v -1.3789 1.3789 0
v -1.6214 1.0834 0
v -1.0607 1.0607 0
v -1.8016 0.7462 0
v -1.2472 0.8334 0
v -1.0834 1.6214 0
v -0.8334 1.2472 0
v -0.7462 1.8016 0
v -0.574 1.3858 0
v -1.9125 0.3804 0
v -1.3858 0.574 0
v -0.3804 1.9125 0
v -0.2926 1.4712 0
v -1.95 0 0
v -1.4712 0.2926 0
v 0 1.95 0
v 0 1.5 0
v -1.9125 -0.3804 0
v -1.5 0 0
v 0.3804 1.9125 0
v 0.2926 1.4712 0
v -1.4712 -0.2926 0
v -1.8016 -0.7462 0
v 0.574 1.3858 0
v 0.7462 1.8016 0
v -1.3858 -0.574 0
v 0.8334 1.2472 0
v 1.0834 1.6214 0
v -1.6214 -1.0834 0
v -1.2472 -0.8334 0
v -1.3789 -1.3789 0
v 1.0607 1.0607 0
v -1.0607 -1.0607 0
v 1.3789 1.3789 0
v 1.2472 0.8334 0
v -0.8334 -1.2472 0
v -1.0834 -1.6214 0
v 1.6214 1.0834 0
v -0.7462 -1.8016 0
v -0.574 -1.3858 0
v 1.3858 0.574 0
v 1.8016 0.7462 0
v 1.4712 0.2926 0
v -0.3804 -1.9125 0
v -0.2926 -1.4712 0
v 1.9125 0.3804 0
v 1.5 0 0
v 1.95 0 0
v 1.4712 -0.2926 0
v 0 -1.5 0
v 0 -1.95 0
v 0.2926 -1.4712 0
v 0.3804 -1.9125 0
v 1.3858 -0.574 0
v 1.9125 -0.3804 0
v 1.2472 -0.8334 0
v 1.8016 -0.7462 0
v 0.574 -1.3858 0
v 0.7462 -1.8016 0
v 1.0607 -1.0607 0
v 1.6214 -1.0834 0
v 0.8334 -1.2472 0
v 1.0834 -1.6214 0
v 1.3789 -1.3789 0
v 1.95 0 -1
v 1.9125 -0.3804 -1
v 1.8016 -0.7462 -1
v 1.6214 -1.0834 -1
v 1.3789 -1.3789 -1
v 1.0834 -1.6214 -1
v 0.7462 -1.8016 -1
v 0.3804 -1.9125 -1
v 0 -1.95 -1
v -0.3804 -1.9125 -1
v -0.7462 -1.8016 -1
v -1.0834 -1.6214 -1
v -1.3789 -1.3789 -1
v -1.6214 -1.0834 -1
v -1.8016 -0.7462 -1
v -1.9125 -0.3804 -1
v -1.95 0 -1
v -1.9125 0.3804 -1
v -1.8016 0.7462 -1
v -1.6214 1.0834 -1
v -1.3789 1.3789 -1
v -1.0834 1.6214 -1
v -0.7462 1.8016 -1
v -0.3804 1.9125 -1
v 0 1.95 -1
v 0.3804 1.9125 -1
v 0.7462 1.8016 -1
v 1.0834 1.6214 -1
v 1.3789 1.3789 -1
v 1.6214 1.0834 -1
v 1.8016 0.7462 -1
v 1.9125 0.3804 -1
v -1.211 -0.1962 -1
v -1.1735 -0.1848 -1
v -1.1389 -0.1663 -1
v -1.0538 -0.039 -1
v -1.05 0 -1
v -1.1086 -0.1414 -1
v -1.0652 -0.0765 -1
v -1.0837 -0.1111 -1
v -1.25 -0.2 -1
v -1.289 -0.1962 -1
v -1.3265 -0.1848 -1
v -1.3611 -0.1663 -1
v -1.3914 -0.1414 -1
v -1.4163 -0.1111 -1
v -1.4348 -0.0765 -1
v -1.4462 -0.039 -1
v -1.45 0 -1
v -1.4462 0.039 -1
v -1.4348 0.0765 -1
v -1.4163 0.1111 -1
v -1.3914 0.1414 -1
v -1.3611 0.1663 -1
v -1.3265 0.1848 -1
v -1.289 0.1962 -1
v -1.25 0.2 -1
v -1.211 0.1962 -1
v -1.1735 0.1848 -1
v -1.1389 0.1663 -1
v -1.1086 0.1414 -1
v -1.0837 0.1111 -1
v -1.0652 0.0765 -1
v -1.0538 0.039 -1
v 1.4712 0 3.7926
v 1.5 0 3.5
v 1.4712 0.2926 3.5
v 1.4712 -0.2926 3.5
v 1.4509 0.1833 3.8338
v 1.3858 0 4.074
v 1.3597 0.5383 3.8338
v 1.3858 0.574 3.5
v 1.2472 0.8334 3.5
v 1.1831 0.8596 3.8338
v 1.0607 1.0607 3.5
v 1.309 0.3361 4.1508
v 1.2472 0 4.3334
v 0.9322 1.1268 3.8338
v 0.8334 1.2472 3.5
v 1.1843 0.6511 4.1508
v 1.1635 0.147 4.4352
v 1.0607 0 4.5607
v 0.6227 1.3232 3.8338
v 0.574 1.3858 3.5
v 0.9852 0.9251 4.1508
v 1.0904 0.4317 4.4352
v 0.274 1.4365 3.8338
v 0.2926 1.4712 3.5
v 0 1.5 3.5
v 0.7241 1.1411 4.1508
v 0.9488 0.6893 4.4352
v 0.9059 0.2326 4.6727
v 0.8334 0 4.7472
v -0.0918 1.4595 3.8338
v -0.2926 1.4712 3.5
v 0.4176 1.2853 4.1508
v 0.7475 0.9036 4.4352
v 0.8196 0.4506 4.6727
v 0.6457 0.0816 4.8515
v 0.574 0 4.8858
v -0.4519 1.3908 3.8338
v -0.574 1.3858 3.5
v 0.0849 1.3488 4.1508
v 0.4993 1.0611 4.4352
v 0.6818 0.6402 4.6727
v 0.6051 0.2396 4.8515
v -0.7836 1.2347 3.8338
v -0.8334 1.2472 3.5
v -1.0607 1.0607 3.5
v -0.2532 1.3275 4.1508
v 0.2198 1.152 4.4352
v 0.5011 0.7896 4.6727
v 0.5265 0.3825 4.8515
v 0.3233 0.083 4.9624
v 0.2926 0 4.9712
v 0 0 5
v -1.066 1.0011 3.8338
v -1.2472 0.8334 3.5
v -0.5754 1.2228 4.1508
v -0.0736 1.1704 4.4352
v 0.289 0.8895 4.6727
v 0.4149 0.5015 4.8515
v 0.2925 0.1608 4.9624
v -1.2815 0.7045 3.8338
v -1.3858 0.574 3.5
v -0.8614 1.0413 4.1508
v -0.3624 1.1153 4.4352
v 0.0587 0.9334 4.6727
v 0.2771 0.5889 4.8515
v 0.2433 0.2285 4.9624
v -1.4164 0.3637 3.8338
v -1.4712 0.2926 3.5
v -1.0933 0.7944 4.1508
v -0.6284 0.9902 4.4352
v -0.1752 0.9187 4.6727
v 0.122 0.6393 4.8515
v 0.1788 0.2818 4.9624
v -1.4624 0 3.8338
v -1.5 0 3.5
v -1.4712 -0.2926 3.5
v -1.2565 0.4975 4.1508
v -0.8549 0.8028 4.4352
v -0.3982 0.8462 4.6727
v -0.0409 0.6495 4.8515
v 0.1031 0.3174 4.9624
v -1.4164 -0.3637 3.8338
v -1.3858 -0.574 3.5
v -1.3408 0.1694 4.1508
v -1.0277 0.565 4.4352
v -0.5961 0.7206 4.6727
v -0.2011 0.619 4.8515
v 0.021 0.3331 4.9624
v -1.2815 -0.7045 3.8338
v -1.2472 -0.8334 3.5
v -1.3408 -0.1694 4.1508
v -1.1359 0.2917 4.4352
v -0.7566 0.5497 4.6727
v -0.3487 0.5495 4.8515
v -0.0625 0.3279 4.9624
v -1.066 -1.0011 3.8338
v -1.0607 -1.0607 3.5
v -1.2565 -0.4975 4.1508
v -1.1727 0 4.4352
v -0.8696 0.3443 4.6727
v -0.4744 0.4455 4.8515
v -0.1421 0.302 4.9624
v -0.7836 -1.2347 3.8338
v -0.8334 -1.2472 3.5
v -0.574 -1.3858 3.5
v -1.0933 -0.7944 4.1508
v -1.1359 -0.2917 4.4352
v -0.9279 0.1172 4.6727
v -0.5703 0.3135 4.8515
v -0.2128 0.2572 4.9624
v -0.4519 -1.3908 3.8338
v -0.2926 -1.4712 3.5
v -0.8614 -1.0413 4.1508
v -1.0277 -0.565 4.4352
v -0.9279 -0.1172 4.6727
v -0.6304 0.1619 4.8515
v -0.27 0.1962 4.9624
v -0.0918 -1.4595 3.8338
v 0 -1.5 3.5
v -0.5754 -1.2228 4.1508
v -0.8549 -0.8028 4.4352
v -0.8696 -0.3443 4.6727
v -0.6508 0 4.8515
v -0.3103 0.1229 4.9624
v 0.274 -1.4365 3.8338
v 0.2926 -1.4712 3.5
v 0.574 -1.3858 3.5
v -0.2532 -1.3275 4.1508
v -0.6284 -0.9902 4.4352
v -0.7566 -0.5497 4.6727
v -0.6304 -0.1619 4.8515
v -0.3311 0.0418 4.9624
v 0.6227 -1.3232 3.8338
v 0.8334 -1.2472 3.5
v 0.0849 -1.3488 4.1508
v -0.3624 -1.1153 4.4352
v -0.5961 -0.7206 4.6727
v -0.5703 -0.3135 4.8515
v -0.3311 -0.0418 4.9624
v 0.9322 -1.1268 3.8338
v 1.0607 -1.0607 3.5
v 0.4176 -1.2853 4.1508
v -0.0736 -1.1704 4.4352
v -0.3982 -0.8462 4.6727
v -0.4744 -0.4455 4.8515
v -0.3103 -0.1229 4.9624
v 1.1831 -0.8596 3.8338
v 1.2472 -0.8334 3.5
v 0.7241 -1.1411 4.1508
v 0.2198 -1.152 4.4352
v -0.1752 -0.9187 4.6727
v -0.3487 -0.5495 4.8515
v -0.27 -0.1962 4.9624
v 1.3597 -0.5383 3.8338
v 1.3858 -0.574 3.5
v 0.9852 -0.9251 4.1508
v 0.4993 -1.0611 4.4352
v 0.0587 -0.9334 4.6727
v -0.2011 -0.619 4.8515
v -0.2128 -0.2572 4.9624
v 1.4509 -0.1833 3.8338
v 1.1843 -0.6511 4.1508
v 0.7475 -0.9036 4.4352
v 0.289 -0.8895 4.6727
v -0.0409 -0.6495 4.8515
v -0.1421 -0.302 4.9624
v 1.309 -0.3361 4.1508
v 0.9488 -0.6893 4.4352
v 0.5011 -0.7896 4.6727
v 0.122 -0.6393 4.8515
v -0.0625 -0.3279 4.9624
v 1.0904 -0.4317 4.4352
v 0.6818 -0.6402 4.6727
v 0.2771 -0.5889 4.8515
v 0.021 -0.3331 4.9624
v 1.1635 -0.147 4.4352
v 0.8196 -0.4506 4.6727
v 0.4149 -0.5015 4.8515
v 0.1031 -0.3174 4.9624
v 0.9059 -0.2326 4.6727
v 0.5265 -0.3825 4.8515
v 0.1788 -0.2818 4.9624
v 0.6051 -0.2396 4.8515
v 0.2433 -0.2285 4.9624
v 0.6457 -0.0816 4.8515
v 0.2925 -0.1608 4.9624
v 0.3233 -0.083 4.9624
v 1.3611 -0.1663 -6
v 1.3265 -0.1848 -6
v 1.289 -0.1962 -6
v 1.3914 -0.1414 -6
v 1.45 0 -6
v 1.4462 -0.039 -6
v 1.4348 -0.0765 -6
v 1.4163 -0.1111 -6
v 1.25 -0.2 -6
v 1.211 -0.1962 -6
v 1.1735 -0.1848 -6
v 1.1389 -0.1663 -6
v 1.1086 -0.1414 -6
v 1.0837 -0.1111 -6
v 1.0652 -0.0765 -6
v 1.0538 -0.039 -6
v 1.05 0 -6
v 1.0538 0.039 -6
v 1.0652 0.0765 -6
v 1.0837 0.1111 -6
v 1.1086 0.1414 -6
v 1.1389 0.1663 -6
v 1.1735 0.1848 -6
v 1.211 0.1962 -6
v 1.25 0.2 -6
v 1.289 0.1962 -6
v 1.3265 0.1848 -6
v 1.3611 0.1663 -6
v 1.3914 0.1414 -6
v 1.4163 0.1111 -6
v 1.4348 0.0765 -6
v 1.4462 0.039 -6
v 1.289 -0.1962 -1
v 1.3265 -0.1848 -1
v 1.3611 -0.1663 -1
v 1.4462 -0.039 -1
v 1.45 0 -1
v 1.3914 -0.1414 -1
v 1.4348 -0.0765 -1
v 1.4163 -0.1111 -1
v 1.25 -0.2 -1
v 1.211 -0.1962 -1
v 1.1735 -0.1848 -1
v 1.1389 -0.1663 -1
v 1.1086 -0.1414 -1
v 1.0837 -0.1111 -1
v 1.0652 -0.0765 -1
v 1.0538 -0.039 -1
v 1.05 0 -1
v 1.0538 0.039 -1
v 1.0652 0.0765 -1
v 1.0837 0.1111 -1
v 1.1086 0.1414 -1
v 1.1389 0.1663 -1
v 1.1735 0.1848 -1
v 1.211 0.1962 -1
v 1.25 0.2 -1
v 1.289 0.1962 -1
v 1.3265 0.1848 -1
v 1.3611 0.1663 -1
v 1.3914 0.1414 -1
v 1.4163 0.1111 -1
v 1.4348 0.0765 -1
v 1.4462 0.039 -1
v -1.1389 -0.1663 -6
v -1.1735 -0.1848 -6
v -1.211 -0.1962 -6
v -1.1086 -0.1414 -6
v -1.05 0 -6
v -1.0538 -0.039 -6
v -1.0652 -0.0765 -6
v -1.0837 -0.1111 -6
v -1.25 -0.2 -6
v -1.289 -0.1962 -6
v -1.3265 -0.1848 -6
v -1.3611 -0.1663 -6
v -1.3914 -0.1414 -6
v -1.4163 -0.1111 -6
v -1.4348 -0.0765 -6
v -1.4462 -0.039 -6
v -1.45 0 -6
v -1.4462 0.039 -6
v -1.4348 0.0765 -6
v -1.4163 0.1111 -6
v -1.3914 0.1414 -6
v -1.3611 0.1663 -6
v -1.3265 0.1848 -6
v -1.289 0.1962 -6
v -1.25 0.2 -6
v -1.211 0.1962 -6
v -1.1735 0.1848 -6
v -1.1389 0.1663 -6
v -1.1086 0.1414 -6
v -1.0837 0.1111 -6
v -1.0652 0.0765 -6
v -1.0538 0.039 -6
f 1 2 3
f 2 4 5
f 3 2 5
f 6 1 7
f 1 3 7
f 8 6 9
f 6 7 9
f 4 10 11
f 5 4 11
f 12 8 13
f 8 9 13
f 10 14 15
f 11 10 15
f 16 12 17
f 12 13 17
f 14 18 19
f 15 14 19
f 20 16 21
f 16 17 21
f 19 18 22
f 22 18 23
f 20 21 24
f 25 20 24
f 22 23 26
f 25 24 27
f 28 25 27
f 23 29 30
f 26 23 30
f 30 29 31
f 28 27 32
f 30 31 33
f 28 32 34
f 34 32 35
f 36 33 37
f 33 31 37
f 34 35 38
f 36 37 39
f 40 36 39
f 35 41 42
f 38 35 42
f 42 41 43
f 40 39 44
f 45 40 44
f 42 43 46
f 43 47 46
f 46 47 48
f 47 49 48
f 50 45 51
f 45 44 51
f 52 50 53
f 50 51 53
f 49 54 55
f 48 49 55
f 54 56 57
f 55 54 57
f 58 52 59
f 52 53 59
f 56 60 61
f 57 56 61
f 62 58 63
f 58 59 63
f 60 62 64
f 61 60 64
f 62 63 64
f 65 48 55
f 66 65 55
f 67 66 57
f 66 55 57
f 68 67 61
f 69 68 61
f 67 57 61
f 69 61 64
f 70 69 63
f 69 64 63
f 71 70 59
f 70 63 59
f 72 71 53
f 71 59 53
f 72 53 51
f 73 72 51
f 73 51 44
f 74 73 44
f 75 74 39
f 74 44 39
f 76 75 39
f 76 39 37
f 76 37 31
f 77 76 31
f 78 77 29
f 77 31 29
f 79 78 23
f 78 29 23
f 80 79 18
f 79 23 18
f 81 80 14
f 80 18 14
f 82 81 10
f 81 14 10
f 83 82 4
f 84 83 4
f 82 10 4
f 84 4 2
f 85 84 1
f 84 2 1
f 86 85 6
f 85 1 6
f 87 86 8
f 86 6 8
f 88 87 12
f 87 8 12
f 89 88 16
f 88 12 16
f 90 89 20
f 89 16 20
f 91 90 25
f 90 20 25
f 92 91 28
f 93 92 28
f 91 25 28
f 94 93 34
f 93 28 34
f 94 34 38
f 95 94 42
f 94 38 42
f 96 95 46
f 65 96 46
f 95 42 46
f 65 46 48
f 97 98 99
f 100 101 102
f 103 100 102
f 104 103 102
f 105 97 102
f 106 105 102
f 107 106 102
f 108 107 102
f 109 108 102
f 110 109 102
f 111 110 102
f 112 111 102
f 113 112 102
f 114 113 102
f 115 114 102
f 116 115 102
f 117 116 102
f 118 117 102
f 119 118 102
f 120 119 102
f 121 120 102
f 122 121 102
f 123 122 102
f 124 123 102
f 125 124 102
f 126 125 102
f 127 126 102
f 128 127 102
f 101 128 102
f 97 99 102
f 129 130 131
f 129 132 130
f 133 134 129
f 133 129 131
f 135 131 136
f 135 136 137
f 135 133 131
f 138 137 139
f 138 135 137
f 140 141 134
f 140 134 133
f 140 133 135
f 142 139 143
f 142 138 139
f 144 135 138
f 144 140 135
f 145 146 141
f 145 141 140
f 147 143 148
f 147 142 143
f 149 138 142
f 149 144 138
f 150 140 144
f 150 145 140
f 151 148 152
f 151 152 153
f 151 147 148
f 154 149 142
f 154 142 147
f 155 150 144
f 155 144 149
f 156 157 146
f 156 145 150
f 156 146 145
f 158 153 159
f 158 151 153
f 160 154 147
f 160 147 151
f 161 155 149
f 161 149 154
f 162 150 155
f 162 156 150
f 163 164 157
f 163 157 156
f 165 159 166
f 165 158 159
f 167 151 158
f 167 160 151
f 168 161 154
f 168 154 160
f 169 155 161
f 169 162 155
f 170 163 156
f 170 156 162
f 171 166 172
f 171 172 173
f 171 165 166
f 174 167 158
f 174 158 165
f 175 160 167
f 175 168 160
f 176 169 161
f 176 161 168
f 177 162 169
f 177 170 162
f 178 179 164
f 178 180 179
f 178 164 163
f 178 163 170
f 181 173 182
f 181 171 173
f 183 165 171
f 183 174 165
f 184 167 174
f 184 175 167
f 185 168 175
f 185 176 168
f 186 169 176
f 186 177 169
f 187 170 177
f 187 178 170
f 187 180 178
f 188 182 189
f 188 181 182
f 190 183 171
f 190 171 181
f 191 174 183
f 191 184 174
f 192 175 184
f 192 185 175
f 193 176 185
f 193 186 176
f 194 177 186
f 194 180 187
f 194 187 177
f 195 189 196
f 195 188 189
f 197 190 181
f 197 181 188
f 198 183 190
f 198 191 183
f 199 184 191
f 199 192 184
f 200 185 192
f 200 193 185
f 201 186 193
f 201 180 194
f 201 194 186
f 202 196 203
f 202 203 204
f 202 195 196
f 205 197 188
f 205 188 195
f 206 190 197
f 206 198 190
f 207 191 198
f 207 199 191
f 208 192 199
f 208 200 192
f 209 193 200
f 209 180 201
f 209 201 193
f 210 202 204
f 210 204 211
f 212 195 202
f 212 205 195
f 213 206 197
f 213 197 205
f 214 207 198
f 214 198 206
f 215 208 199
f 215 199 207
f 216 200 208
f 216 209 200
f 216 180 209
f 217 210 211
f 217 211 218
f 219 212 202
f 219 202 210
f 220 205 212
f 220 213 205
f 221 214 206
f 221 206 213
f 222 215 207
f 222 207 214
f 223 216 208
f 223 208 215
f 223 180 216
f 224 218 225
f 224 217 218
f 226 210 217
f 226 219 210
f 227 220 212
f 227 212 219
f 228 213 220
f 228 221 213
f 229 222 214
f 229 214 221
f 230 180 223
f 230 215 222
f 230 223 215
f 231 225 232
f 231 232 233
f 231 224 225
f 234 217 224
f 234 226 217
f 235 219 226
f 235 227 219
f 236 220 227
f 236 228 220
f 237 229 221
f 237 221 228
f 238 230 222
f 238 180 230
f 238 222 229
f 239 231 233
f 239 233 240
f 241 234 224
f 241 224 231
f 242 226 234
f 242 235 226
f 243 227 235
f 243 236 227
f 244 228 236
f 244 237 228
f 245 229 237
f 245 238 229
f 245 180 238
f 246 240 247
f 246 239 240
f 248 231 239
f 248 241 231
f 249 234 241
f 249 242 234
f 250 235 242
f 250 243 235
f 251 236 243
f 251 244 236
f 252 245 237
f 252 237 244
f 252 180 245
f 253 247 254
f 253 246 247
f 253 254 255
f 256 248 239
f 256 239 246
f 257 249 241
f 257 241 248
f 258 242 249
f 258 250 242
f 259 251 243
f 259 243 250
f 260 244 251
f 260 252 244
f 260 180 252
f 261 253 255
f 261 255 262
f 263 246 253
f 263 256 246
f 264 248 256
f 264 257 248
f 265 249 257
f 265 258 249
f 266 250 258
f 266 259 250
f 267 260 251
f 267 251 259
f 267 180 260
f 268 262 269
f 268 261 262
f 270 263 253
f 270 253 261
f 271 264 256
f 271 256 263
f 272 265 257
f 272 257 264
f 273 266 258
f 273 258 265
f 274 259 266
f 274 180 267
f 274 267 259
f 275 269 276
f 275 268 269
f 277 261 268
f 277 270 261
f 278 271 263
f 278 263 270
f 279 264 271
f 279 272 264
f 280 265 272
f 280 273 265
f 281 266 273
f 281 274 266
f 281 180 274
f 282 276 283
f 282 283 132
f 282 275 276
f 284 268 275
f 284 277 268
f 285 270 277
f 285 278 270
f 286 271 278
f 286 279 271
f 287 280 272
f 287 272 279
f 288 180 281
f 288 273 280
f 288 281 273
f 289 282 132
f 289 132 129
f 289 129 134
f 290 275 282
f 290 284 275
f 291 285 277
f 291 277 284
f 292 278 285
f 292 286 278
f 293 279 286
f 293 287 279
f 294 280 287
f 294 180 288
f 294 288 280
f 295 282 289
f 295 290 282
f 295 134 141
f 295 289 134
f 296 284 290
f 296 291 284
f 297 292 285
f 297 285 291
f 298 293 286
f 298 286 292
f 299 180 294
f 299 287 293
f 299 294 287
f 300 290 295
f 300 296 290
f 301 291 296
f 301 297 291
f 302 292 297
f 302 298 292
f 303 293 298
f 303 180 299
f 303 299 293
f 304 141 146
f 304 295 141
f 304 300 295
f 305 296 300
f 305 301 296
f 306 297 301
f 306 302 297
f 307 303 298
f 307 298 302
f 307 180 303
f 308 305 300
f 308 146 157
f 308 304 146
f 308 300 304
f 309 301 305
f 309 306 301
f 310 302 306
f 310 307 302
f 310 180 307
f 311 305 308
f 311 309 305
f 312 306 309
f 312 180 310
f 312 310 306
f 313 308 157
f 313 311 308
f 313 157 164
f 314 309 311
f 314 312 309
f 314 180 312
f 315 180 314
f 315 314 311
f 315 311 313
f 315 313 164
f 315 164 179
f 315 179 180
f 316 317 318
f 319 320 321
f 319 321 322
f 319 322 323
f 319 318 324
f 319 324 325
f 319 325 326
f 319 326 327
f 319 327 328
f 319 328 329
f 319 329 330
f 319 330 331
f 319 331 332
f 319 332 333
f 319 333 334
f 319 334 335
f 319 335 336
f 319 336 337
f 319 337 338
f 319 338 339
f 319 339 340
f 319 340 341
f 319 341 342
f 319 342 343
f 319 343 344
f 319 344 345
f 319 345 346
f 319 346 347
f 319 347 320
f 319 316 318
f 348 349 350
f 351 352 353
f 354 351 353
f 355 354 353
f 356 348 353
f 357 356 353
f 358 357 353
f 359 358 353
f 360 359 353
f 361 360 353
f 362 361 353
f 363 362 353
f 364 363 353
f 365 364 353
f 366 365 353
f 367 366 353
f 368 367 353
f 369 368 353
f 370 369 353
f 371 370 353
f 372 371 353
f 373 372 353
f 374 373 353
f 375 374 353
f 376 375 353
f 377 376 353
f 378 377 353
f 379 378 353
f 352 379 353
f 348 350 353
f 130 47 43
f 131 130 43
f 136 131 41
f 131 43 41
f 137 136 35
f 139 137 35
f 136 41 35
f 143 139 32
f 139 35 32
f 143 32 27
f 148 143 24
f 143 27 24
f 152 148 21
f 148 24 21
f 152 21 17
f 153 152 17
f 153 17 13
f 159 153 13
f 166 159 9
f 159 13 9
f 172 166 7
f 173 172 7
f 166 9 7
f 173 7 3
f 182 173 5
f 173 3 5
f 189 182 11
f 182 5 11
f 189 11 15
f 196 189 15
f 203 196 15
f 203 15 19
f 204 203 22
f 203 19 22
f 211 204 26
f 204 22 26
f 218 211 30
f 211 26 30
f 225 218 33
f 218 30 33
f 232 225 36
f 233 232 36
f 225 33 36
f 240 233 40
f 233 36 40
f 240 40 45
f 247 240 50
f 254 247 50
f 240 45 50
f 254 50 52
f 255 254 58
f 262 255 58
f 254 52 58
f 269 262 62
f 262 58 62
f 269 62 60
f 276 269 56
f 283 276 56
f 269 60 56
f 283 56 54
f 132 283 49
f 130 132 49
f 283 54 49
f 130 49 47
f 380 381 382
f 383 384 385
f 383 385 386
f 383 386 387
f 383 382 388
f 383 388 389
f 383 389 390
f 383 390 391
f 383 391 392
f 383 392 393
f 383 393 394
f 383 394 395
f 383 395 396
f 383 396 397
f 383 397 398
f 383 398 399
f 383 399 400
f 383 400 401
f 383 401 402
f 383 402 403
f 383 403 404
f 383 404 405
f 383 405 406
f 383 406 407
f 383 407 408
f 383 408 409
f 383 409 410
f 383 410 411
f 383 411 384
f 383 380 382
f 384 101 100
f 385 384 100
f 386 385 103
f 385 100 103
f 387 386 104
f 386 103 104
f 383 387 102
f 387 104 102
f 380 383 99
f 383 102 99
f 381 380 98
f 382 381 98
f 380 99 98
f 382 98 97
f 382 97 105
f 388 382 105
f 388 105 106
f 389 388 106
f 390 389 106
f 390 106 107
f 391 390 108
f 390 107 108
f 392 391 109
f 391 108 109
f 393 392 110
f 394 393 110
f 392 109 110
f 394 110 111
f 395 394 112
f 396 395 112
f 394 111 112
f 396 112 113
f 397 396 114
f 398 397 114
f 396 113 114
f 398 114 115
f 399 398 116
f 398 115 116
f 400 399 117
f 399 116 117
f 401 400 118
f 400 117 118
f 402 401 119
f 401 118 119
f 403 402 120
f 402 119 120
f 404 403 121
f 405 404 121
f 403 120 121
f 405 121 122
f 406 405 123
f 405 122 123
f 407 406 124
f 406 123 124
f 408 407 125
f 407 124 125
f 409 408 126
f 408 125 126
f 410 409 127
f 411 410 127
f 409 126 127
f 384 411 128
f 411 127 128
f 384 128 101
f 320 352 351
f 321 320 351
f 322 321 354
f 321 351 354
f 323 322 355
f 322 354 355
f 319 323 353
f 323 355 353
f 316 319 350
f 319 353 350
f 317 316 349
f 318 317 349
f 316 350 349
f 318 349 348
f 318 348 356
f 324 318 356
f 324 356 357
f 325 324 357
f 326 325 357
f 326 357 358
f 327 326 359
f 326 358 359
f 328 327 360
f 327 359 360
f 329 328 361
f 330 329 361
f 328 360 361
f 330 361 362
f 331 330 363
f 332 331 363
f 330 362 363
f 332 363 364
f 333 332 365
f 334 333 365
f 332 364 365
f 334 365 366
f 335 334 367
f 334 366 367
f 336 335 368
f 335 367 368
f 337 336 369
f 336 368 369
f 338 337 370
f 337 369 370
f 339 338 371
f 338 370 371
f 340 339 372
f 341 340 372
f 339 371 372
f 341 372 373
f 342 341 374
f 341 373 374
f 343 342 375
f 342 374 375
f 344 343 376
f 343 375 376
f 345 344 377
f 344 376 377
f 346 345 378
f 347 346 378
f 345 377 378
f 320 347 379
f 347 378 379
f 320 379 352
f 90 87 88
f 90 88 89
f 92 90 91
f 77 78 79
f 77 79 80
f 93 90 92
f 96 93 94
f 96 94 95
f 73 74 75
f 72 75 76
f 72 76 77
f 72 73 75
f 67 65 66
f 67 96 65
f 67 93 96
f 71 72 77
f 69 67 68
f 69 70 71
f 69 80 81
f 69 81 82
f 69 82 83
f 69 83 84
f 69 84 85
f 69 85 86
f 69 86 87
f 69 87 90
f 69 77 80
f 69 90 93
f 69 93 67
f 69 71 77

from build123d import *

# Parameters (mm, degrees)
F0_R     = 1.5
F1_DEPTH = 5
F2_R     = 1.95
F3_DEPTH = 1
F4_R     = 0.2
F5_DEPTH = 5
F6_R     = 1.5


with BuildPart() as f1:
    # F0 (on Top) → F1 (new body)
    with BuildSketch(Plane.XY):
        Circle(F0_R)
    extrude(amount=F1_DEPTH)

    # F2 (on face) → F3 (join)
    with BuildSketch(Plane(origin=(0, 0, 0), x_dir=(1, 0, 0), z_dir=(0, 0, -1))):
        Circle(F2_R)
    extrude(amount=F3_DEPTH)

    # F6
    f6_edges = [f1.edges().sort_by_distance(p)[0] for p in [
        (-1.5, 0, 5),
    ]]
    fillet(f6_edges, radius=F6_R)


with BuildPart() as f5:
    # F4 (on face) → F5 (new body)
    with BuildSketch(Plane(origin=(0, 0, -1), x_dir=(1, 0, 0), z_dir=(0, 0, -1))):
        with Locations((-1.25, 0)):
            Circle(F4_R)
        with Locations((1.25, 0)):
            Circle(F4_R)
    extrude(amount=F5_DEPTH)


solid = Compound([f1.part, f5.part])
